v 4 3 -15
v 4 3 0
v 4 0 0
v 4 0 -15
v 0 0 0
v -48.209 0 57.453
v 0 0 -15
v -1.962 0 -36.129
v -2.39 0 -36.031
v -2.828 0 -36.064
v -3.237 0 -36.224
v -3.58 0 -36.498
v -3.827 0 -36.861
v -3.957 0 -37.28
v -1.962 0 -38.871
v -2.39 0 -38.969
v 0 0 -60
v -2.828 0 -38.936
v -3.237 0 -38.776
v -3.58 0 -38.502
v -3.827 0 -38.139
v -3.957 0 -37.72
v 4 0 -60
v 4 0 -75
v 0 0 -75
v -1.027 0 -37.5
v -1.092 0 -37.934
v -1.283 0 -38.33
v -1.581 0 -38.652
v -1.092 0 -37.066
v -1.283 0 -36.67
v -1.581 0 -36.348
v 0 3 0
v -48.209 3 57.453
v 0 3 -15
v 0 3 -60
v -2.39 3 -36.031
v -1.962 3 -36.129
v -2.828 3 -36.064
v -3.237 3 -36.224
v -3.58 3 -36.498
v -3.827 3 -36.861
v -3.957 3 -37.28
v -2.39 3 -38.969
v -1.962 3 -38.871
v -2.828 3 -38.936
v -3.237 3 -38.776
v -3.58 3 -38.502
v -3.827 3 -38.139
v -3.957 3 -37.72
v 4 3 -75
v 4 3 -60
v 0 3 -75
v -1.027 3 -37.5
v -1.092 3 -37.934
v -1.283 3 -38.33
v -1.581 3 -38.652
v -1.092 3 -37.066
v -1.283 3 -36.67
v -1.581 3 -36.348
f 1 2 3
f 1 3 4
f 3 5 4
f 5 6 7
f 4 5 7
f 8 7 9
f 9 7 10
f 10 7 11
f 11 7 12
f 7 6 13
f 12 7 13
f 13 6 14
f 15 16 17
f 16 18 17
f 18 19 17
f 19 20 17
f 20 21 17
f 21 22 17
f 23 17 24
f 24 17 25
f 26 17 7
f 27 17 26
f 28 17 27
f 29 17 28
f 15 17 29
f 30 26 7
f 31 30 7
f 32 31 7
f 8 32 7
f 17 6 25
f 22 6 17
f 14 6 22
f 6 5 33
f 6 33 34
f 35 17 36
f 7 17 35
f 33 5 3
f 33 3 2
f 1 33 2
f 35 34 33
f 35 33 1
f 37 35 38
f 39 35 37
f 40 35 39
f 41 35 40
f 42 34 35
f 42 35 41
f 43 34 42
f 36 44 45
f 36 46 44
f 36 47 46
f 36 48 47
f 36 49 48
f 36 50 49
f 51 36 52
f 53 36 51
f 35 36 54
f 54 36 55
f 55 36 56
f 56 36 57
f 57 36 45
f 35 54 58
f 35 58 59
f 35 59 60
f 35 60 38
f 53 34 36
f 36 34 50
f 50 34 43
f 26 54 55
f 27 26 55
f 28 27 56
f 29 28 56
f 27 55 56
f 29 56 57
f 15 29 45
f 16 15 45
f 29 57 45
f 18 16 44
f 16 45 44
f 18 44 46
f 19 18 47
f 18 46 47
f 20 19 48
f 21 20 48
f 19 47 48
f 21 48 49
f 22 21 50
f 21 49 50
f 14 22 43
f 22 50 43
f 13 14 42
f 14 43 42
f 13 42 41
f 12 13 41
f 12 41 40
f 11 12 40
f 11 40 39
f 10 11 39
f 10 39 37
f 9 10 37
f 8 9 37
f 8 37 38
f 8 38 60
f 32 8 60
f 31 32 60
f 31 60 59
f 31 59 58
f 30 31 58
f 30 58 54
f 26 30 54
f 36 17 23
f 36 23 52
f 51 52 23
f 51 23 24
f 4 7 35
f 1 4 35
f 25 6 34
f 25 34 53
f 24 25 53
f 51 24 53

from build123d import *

# Parameters (mm, degrees)
BOSS_EXTRUDE1_DEPTH = 3
SKETCH2_W           = 15
SKETCH2_H           = 3
BOSS_EXTRUDE2_DEPTH = 4
SKETCH3_R           = 1.4732
CUT_EXTRUDE1_DEPTH  = 4


with BuildPart() as part:
    # Sketch1 → Boss-Extrude1 (new body)
    with BuildSketch(Plane(origin=(0, 0, 0), x_dir=(1, 0, 0), z_dir=(0, 1, 0))):
        Polygon((-48.209070726, -57.453333234), (0, 75), (0, 0), align=None)
    extrude(amount=BOSS_EXTRUDE1_DEPTH)

    # Sketch2 → Boss-Extrude2 (add)
    with BuildSketch(Plane(origin=(0, 0, 0), x_dir=(0, 0, -1), z_dir=(1, 0, 0))):
        with Locations((7.5, 1.5)):
            Rectangle(SKETCH2_W, SKETCH2_H)
        with Locations((67.5, 1.5)):
            Rectangle(SKETCH2_W, SKETCH2_H)
    extrude(amount=BOSS_EXTRUDE2_DEPTH)

    # Sketch3 → Cut-Extrude1 (cut, through all)
    with BuildSketch(Plane(origin=(0, 3, 0), x_dir=(1, 0, 0), z_dir=(0, 1, 0))):
        with Locations((-2.5, 37.5)):
            Circle(SKETCH3_R)
    extrude(amount=-CUT_EXTRUDE1_DEPTH, mode=Mode.SUBTRACT)


solid = part.part
